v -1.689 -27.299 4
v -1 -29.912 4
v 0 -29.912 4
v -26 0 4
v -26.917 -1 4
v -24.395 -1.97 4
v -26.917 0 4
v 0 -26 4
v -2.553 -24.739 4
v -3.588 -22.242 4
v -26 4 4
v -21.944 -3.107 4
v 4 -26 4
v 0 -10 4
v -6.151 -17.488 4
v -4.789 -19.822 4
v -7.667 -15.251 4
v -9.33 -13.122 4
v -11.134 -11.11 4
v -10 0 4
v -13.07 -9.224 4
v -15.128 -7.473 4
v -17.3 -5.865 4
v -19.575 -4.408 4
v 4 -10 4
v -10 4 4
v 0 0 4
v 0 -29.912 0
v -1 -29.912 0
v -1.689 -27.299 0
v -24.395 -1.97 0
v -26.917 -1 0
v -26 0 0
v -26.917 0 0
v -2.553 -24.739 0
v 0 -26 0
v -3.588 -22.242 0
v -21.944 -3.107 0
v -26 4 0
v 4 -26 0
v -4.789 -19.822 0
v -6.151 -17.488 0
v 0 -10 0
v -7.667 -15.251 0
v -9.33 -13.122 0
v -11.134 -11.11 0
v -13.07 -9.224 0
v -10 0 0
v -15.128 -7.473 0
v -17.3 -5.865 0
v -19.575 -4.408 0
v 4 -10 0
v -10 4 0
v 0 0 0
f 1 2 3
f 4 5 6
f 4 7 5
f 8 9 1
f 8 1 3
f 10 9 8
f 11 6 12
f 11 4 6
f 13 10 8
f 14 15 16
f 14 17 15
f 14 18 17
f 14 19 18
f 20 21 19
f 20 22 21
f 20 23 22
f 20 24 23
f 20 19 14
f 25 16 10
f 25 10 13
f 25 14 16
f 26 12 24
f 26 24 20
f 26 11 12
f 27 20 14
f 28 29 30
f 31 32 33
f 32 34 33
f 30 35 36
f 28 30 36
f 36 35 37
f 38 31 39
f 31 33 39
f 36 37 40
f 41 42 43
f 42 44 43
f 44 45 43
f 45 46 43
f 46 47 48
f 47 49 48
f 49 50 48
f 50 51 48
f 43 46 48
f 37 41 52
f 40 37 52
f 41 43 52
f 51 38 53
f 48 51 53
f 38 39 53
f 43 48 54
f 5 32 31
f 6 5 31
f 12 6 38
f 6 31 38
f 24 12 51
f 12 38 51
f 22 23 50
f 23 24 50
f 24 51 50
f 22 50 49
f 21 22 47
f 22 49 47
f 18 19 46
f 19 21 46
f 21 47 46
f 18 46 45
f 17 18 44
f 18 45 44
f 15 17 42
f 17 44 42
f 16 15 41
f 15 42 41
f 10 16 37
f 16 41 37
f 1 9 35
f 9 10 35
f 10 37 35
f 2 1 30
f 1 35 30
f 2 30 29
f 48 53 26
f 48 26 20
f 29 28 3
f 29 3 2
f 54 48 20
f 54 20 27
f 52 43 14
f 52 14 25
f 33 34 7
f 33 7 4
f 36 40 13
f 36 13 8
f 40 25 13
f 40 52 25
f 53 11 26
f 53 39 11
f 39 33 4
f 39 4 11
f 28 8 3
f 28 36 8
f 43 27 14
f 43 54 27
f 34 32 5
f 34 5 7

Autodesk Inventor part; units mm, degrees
ref_plane "YZ Plane" through (0, 0, 0) normal (1, 0, 0) x (0, 1, 0)
ref_plane "XZ Plane" through (0, 0, 0) normal (0, 1, 0) x (-1, 0, 0)
ref_plane "XY Plane" through (0, 0, 0) normal (0, 0, 1) x (1, 0, 0)
sketch "Эскиз1" plane through (0, 0, 0) normal (0, 0, 1) x (1, 0, 0)
  line L0 (0, 0) -> (0, -10)
  line L1 (0, -10) -> (4, -10)
  line L2 (4, -10) -> (4, -26)
  line L3 (4, -26) -> (0, -26)
  line L4 (0, -26) -> (0, -29.9118)
  line L5 (0, -29.9118) -> (-1, -29.9118)
  arc A0 (-1, -29.9118) -> (-26.9172, -1) centre (-40, -38.8) ccw
  line L6 (-26.9172, -1) -> (-26.9172, 0)
  line L7 (-26.9172, 0) -> (-26, 0)
  line L8 (-26, 0) -> (-26, 4)
  line L9 (-26, 4) -> (-10, 4)
  line L10 (-10, 4) -> (-10, 0)
  line L11 (-10, 0) -> (0, 0)
  dimension "d0" = 40
  dimension "d1" = 1
  dimension "d3" = 38.8
  dimension "d4" = 4
  dimension "d5" = 40
  dimension "d6" = 16
  dimension "d7" = 10
  dimension "d8" = 16
  dimension "d9" = 10
extrude "Выдавливание1" add sketch "Эскиз1" along normal blind 4
properties part number "protector" material "Дерево (береза)"
